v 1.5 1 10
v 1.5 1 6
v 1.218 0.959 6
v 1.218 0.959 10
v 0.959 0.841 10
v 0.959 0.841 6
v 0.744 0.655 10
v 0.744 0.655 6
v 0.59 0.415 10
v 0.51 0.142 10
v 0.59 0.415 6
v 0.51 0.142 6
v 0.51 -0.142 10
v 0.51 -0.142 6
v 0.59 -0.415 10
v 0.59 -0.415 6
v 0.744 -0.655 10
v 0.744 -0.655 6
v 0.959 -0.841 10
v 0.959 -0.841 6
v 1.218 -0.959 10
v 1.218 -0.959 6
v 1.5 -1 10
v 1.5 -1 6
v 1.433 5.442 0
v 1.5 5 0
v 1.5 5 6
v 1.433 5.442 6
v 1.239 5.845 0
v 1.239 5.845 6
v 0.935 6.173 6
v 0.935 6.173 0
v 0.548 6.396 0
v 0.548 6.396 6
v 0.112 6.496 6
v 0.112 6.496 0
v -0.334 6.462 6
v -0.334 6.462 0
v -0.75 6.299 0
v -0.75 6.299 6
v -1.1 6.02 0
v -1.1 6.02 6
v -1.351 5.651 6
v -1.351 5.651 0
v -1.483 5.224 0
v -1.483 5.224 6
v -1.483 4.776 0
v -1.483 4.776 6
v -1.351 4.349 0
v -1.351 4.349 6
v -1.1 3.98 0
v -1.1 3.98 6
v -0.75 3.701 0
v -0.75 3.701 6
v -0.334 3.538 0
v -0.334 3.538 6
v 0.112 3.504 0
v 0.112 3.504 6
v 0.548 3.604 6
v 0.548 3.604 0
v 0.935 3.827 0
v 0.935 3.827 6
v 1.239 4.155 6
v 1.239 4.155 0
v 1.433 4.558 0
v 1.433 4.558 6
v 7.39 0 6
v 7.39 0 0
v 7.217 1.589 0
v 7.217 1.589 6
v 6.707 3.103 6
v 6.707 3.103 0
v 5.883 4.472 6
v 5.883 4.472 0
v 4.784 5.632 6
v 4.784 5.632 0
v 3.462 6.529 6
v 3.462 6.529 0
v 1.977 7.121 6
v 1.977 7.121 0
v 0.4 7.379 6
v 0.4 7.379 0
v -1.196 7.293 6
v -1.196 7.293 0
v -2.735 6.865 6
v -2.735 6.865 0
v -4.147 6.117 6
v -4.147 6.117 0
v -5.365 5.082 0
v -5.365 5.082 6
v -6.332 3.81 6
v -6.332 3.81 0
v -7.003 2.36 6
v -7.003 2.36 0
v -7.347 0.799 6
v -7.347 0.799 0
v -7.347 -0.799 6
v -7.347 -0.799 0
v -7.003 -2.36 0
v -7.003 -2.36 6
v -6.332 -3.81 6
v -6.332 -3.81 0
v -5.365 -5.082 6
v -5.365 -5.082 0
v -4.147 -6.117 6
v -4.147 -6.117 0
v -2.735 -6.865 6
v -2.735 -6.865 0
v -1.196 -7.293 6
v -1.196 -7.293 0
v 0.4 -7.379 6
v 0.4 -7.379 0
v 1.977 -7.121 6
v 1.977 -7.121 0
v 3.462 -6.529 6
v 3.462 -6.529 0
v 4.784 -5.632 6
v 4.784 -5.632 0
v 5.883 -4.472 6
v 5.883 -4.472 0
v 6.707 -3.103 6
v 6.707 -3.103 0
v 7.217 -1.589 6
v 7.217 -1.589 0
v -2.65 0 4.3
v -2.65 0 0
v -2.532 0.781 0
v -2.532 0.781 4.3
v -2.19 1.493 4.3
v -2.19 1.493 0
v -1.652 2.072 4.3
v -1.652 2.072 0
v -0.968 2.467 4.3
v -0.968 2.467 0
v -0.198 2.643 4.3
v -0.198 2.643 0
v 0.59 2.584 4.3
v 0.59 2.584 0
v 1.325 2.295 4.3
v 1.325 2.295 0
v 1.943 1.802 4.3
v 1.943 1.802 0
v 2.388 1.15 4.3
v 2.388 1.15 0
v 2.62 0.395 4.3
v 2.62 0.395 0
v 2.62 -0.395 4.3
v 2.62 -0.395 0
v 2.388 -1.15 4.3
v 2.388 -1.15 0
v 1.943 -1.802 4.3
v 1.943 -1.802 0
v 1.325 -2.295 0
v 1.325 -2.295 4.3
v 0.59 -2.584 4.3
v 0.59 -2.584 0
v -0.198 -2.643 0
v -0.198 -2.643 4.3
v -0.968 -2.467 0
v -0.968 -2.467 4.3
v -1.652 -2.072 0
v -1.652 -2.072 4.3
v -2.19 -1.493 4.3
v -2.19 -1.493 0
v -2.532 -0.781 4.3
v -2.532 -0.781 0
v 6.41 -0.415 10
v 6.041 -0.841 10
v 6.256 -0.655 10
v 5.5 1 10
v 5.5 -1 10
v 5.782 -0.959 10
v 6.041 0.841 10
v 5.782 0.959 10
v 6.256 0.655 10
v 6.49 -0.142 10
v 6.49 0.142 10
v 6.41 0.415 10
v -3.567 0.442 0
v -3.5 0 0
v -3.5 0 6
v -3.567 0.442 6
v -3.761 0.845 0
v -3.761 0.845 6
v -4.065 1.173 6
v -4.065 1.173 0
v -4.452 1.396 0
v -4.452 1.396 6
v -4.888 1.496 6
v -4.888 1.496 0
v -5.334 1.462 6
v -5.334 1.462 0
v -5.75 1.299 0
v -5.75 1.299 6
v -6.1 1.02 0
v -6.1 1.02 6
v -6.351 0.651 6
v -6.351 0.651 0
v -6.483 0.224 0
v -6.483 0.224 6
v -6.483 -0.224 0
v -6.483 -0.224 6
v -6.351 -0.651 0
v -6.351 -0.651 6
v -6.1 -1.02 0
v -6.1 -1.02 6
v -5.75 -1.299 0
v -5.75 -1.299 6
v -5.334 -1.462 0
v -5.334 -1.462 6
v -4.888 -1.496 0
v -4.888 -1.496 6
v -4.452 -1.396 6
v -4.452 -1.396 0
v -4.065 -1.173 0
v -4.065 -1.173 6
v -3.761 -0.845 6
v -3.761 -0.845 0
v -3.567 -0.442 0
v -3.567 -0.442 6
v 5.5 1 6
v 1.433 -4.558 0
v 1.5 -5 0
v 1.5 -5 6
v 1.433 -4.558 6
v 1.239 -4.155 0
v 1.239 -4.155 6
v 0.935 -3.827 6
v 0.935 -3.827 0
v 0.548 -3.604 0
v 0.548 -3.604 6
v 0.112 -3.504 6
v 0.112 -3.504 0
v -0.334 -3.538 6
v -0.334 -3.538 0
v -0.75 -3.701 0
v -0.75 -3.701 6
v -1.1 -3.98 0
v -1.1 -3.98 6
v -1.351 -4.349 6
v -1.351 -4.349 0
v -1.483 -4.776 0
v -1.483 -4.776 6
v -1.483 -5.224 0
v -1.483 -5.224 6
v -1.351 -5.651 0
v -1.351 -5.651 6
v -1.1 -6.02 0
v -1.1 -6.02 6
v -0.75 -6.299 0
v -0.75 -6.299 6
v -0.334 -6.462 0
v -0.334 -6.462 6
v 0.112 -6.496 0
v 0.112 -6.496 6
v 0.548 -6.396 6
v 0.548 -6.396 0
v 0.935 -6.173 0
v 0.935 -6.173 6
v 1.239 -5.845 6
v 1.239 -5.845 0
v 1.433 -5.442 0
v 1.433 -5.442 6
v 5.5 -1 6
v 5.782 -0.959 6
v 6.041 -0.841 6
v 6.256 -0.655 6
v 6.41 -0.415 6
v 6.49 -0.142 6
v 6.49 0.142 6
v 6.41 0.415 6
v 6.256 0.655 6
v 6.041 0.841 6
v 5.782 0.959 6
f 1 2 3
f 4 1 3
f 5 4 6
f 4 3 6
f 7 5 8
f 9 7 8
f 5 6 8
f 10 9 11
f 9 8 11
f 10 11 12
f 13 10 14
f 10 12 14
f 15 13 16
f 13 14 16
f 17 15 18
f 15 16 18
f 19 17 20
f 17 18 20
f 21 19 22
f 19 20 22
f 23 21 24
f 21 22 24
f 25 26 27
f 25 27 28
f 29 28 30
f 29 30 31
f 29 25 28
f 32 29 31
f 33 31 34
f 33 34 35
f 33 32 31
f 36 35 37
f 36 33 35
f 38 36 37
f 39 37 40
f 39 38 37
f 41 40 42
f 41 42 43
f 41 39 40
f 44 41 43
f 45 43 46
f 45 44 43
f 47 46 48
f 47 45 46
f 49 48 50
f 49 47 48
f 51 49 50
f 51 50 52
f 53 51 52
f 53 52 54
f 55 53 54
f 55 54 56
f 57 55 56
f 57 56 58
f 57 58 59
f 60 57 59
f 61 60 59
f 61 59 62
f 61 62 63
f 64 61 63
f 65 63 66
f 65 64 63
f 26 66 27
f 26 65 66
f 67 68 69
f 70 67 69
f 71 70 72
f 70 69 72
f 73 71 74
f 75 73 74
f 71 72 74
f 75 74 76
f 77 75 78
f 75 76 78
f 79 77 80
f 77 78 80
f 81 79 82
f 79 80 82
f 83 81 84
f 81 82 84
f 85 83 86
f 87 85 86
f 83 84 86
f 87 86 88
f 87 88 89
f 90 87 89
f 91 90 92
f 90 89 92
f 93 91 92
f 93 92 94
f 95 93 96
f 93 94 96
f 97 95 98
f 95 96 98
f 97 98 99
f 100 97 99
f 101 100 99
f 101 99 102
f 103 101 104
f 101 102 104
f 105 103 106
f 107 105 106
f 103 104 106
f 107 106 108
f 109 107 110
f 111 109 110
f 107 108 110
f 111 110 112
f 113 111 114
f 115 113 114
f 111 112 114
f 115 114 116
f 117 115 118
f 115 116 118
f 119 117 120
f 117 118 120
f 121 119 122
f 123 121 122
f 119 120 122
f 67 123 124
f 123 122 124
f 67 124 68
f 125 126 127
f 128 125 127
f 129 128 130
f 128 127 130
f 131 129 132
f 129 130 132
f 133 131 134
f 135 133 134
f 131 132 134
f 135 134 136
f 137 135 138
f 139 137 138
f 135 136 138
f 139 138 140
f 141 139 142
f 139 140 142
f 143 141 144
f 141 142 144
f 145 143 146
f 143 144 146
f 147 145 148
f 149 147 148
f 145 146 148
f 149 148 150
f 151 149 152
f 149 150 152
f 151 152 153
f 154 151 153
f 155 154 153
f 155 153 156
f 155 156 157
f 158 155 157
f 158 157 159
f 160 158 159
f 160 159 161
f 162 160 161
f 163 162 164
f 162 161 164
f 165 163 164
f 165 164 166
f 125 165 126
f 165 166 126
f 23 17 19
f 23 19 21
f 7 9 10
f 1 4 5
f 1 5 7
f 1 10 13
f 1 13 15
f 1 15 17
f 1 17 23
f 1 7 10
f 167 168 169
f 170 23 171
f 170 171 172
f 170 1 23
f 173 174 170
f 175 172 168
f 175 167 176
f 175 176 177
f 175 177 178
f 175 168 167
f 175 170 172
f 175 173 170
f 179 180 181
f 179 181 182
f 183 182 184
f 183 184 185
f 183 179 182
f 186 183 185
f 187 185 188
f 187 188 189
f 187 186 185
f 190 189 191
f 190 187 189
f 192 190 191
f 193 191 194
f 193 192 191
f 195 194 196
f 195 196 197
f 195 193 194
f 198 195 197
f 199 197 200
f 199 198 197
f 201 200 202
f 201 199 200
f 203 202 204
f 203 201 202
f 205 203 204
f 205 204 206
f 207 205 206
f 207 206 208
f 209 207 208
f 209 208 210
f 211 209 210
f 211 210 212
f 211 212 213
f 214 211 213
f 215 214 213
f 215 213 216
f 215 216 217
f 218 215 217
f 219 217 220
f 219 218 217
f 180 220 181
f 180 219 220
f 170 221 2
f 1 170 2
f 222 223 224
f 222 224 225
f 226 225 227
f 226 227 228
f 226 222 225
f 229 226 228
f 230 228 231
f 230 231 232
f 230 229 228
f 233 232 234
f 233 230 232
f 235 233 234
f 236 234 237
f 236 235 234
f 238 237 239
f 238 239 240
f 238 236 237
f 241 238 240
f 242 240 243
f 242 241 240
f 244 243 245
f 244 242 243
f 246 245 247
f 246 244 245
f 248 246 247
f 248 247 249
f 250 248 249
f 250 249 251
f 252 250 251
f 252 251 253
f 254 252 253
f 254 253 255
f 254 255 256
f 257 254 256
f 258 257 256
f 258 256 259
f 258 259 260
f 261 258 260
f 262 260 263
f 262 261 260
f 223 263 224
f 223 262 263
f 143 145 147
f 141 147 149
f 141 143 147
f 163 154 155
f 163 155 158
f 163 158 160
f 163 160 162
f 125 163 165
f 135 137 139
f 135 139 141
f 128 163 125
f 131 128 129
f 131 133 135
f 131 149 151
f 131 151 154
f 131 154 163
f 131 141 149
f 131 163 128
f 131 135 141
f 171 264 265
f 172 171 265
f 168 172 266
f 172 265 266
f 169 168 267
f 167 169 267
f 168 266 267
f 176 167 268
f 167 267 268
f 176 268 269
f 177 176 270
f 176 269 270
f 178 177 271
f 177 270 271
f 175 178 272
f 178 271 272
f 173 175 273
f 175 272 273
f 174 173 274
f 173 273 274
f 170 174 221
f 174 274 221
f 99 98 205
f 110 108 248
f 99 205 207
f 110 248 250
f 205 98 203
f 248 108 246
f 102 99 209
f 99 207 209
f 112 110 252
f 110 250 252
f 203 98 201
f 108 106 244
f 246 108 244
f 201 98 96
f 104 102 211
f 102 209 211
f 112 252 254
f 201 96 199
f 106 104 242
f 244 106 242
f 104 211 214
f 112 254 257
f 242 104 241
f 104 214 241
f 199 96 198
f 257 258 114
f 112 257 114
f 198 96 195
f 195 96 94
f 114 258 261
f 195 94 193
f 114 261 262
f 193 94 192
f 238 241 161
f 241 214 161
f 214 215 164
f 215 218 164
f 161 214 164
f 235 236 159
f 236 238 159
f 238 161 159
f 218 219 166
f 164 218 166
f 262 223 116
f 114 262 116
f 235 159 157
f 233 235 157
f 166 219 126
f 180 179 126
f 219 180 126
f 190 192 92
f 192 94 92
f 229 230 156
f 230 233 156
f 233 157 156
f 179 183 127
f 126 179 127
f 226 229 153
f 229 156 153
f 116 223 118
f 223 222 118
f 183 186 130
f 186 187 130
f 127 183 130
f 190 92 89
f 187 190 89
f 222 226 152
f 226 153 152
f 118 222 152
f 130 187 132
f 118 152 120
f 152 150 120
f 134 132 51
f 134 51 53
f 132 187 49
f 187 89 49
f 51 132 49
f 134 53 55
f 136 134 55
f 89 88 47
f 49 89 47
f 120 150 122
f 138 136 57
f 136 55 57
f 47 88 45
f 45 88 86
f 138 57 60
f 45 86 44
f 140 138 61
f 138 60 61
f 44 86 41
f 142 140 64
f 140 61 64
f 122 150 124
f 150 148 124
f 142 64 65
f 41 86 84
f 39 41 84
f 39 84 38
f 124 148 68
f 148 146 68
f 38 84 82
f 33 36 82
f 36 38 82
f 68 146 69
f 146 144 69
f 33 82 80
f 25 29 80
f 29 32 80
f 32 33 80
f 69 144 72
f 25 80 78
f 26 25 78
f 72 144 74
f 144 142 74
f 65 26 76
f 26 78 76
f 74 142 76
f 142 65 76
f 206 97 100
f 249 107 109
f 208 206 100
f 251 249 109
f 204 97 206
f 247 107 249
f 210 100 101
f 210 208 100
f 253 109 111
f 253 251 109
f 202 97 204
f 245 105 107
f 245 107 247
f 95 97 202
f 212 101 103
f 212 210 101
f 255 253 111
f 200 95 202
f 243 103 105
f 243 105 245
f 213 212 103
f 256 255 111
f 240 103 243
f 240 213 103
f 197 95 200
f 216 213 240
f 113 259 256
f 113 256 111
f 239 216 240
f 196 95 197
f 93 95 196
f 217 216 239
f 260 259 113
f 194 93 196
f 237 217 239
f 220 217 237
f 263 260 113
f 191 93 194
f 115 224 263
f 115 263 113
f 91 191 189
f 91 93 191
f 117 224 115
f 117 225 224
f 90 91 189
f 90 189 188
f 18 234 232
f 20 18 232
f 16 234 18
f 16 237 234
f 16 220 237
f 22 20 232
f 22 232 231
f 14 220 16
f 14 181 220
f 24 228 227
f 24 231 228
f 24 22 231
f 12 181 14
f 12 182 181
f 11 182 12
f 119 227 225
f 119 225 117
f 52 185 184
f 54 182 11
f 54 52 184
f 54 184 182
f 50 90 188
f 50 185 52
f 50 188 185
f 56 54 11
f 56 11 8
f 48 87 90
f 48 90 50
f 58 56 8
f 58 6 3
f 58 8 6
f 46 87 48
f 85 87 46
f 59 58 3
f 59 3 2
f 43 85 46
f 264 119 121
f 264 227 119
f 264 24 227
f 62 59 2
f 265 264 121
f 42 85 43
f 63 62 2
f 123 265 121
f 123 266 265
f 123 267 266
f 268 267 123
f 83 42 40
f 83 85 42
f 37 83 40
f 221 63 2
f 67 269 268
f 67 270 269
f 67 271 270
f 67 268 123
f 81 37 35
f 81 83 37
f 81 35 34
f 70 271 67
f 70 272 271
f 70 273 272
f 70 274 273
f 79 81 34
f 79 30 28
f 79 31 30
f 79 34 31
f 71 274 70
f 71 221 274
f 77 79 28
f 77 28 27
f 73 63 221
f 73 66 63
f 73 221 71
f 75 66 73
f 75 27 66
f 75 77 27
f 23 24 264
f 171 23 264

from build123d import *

# Parameters (mm, degrees)
SKETCH1_R           = 7.39
SKETCH1_R_2         = 1.5
BOSS_EXTRUDE1_DEPTH = 6
BOSS_EXTRUDE2_DEPTH = 10
SKETCH2_R           = 2.65
CUT_EXTRUDE1_DEPTH  = 4.3


with BuildPart() as part:
    # Sketch1 → Boss-Extrude1 (new body)
    with BuildSketch(Plane.XY):
        Circle(SKETCH1_R)
        with Locations((-5, 0)):
            Circle(SKETCH1_R_2, mode=Mode.SUBTRACT)
        with Locations((0, -5)):
            Circle(SKETCH1_R_2, mode=Mode.SUBTRACT)
        with BuildLine():
            ThreePointArc((5.5, 1), (6.5, 0), (5.5, -1))
            Line((5.5, -1), (1.5, -1))
            ThreePointArc((1.5, -1), (0.5, 0), (1.5, 1))
            Line((1.5, 1), (5.5, 1))
        make_face(mode=Mode.SUBTRACT)
        with Locations((0, 5)):
            Circle(SKETCH1_R_2, mode=Mode.SUBTRACT)
    extrude(amount=BOSS_EXTRUDE1_DEPTH)

    # Sketch1<3> → Boss-Extrude2 (add)
    with BuildSketch(Plane.XY):
        with BuildLine():
            Line((1.5, -1), (5.5, -1))
            ThreePointArc((5.5, -1), (6.5, 0), (5.5, 1))
            Line((5.5, 1), (1.5, 1))
            ThreePointArc((1.5, 1), (0.5, 0), (1.5, -1))
        make_face()
    extrude(amount=BOSS_EXTRUDE2_DEPTH)

    # Sketch2 → Cut-Extrude1 (cut)
    with BuildSketch(Plane(origin=(0, 0, 0), x_dir=(-1, 0, 0), z_dir=(0, 0, -1))):
        Circle(SKETCH2_R)
    extrude(amount=-CUT_EXTRUDE1_DEPTH, mode=Mode.SUBTRACT)


solid = part.part
